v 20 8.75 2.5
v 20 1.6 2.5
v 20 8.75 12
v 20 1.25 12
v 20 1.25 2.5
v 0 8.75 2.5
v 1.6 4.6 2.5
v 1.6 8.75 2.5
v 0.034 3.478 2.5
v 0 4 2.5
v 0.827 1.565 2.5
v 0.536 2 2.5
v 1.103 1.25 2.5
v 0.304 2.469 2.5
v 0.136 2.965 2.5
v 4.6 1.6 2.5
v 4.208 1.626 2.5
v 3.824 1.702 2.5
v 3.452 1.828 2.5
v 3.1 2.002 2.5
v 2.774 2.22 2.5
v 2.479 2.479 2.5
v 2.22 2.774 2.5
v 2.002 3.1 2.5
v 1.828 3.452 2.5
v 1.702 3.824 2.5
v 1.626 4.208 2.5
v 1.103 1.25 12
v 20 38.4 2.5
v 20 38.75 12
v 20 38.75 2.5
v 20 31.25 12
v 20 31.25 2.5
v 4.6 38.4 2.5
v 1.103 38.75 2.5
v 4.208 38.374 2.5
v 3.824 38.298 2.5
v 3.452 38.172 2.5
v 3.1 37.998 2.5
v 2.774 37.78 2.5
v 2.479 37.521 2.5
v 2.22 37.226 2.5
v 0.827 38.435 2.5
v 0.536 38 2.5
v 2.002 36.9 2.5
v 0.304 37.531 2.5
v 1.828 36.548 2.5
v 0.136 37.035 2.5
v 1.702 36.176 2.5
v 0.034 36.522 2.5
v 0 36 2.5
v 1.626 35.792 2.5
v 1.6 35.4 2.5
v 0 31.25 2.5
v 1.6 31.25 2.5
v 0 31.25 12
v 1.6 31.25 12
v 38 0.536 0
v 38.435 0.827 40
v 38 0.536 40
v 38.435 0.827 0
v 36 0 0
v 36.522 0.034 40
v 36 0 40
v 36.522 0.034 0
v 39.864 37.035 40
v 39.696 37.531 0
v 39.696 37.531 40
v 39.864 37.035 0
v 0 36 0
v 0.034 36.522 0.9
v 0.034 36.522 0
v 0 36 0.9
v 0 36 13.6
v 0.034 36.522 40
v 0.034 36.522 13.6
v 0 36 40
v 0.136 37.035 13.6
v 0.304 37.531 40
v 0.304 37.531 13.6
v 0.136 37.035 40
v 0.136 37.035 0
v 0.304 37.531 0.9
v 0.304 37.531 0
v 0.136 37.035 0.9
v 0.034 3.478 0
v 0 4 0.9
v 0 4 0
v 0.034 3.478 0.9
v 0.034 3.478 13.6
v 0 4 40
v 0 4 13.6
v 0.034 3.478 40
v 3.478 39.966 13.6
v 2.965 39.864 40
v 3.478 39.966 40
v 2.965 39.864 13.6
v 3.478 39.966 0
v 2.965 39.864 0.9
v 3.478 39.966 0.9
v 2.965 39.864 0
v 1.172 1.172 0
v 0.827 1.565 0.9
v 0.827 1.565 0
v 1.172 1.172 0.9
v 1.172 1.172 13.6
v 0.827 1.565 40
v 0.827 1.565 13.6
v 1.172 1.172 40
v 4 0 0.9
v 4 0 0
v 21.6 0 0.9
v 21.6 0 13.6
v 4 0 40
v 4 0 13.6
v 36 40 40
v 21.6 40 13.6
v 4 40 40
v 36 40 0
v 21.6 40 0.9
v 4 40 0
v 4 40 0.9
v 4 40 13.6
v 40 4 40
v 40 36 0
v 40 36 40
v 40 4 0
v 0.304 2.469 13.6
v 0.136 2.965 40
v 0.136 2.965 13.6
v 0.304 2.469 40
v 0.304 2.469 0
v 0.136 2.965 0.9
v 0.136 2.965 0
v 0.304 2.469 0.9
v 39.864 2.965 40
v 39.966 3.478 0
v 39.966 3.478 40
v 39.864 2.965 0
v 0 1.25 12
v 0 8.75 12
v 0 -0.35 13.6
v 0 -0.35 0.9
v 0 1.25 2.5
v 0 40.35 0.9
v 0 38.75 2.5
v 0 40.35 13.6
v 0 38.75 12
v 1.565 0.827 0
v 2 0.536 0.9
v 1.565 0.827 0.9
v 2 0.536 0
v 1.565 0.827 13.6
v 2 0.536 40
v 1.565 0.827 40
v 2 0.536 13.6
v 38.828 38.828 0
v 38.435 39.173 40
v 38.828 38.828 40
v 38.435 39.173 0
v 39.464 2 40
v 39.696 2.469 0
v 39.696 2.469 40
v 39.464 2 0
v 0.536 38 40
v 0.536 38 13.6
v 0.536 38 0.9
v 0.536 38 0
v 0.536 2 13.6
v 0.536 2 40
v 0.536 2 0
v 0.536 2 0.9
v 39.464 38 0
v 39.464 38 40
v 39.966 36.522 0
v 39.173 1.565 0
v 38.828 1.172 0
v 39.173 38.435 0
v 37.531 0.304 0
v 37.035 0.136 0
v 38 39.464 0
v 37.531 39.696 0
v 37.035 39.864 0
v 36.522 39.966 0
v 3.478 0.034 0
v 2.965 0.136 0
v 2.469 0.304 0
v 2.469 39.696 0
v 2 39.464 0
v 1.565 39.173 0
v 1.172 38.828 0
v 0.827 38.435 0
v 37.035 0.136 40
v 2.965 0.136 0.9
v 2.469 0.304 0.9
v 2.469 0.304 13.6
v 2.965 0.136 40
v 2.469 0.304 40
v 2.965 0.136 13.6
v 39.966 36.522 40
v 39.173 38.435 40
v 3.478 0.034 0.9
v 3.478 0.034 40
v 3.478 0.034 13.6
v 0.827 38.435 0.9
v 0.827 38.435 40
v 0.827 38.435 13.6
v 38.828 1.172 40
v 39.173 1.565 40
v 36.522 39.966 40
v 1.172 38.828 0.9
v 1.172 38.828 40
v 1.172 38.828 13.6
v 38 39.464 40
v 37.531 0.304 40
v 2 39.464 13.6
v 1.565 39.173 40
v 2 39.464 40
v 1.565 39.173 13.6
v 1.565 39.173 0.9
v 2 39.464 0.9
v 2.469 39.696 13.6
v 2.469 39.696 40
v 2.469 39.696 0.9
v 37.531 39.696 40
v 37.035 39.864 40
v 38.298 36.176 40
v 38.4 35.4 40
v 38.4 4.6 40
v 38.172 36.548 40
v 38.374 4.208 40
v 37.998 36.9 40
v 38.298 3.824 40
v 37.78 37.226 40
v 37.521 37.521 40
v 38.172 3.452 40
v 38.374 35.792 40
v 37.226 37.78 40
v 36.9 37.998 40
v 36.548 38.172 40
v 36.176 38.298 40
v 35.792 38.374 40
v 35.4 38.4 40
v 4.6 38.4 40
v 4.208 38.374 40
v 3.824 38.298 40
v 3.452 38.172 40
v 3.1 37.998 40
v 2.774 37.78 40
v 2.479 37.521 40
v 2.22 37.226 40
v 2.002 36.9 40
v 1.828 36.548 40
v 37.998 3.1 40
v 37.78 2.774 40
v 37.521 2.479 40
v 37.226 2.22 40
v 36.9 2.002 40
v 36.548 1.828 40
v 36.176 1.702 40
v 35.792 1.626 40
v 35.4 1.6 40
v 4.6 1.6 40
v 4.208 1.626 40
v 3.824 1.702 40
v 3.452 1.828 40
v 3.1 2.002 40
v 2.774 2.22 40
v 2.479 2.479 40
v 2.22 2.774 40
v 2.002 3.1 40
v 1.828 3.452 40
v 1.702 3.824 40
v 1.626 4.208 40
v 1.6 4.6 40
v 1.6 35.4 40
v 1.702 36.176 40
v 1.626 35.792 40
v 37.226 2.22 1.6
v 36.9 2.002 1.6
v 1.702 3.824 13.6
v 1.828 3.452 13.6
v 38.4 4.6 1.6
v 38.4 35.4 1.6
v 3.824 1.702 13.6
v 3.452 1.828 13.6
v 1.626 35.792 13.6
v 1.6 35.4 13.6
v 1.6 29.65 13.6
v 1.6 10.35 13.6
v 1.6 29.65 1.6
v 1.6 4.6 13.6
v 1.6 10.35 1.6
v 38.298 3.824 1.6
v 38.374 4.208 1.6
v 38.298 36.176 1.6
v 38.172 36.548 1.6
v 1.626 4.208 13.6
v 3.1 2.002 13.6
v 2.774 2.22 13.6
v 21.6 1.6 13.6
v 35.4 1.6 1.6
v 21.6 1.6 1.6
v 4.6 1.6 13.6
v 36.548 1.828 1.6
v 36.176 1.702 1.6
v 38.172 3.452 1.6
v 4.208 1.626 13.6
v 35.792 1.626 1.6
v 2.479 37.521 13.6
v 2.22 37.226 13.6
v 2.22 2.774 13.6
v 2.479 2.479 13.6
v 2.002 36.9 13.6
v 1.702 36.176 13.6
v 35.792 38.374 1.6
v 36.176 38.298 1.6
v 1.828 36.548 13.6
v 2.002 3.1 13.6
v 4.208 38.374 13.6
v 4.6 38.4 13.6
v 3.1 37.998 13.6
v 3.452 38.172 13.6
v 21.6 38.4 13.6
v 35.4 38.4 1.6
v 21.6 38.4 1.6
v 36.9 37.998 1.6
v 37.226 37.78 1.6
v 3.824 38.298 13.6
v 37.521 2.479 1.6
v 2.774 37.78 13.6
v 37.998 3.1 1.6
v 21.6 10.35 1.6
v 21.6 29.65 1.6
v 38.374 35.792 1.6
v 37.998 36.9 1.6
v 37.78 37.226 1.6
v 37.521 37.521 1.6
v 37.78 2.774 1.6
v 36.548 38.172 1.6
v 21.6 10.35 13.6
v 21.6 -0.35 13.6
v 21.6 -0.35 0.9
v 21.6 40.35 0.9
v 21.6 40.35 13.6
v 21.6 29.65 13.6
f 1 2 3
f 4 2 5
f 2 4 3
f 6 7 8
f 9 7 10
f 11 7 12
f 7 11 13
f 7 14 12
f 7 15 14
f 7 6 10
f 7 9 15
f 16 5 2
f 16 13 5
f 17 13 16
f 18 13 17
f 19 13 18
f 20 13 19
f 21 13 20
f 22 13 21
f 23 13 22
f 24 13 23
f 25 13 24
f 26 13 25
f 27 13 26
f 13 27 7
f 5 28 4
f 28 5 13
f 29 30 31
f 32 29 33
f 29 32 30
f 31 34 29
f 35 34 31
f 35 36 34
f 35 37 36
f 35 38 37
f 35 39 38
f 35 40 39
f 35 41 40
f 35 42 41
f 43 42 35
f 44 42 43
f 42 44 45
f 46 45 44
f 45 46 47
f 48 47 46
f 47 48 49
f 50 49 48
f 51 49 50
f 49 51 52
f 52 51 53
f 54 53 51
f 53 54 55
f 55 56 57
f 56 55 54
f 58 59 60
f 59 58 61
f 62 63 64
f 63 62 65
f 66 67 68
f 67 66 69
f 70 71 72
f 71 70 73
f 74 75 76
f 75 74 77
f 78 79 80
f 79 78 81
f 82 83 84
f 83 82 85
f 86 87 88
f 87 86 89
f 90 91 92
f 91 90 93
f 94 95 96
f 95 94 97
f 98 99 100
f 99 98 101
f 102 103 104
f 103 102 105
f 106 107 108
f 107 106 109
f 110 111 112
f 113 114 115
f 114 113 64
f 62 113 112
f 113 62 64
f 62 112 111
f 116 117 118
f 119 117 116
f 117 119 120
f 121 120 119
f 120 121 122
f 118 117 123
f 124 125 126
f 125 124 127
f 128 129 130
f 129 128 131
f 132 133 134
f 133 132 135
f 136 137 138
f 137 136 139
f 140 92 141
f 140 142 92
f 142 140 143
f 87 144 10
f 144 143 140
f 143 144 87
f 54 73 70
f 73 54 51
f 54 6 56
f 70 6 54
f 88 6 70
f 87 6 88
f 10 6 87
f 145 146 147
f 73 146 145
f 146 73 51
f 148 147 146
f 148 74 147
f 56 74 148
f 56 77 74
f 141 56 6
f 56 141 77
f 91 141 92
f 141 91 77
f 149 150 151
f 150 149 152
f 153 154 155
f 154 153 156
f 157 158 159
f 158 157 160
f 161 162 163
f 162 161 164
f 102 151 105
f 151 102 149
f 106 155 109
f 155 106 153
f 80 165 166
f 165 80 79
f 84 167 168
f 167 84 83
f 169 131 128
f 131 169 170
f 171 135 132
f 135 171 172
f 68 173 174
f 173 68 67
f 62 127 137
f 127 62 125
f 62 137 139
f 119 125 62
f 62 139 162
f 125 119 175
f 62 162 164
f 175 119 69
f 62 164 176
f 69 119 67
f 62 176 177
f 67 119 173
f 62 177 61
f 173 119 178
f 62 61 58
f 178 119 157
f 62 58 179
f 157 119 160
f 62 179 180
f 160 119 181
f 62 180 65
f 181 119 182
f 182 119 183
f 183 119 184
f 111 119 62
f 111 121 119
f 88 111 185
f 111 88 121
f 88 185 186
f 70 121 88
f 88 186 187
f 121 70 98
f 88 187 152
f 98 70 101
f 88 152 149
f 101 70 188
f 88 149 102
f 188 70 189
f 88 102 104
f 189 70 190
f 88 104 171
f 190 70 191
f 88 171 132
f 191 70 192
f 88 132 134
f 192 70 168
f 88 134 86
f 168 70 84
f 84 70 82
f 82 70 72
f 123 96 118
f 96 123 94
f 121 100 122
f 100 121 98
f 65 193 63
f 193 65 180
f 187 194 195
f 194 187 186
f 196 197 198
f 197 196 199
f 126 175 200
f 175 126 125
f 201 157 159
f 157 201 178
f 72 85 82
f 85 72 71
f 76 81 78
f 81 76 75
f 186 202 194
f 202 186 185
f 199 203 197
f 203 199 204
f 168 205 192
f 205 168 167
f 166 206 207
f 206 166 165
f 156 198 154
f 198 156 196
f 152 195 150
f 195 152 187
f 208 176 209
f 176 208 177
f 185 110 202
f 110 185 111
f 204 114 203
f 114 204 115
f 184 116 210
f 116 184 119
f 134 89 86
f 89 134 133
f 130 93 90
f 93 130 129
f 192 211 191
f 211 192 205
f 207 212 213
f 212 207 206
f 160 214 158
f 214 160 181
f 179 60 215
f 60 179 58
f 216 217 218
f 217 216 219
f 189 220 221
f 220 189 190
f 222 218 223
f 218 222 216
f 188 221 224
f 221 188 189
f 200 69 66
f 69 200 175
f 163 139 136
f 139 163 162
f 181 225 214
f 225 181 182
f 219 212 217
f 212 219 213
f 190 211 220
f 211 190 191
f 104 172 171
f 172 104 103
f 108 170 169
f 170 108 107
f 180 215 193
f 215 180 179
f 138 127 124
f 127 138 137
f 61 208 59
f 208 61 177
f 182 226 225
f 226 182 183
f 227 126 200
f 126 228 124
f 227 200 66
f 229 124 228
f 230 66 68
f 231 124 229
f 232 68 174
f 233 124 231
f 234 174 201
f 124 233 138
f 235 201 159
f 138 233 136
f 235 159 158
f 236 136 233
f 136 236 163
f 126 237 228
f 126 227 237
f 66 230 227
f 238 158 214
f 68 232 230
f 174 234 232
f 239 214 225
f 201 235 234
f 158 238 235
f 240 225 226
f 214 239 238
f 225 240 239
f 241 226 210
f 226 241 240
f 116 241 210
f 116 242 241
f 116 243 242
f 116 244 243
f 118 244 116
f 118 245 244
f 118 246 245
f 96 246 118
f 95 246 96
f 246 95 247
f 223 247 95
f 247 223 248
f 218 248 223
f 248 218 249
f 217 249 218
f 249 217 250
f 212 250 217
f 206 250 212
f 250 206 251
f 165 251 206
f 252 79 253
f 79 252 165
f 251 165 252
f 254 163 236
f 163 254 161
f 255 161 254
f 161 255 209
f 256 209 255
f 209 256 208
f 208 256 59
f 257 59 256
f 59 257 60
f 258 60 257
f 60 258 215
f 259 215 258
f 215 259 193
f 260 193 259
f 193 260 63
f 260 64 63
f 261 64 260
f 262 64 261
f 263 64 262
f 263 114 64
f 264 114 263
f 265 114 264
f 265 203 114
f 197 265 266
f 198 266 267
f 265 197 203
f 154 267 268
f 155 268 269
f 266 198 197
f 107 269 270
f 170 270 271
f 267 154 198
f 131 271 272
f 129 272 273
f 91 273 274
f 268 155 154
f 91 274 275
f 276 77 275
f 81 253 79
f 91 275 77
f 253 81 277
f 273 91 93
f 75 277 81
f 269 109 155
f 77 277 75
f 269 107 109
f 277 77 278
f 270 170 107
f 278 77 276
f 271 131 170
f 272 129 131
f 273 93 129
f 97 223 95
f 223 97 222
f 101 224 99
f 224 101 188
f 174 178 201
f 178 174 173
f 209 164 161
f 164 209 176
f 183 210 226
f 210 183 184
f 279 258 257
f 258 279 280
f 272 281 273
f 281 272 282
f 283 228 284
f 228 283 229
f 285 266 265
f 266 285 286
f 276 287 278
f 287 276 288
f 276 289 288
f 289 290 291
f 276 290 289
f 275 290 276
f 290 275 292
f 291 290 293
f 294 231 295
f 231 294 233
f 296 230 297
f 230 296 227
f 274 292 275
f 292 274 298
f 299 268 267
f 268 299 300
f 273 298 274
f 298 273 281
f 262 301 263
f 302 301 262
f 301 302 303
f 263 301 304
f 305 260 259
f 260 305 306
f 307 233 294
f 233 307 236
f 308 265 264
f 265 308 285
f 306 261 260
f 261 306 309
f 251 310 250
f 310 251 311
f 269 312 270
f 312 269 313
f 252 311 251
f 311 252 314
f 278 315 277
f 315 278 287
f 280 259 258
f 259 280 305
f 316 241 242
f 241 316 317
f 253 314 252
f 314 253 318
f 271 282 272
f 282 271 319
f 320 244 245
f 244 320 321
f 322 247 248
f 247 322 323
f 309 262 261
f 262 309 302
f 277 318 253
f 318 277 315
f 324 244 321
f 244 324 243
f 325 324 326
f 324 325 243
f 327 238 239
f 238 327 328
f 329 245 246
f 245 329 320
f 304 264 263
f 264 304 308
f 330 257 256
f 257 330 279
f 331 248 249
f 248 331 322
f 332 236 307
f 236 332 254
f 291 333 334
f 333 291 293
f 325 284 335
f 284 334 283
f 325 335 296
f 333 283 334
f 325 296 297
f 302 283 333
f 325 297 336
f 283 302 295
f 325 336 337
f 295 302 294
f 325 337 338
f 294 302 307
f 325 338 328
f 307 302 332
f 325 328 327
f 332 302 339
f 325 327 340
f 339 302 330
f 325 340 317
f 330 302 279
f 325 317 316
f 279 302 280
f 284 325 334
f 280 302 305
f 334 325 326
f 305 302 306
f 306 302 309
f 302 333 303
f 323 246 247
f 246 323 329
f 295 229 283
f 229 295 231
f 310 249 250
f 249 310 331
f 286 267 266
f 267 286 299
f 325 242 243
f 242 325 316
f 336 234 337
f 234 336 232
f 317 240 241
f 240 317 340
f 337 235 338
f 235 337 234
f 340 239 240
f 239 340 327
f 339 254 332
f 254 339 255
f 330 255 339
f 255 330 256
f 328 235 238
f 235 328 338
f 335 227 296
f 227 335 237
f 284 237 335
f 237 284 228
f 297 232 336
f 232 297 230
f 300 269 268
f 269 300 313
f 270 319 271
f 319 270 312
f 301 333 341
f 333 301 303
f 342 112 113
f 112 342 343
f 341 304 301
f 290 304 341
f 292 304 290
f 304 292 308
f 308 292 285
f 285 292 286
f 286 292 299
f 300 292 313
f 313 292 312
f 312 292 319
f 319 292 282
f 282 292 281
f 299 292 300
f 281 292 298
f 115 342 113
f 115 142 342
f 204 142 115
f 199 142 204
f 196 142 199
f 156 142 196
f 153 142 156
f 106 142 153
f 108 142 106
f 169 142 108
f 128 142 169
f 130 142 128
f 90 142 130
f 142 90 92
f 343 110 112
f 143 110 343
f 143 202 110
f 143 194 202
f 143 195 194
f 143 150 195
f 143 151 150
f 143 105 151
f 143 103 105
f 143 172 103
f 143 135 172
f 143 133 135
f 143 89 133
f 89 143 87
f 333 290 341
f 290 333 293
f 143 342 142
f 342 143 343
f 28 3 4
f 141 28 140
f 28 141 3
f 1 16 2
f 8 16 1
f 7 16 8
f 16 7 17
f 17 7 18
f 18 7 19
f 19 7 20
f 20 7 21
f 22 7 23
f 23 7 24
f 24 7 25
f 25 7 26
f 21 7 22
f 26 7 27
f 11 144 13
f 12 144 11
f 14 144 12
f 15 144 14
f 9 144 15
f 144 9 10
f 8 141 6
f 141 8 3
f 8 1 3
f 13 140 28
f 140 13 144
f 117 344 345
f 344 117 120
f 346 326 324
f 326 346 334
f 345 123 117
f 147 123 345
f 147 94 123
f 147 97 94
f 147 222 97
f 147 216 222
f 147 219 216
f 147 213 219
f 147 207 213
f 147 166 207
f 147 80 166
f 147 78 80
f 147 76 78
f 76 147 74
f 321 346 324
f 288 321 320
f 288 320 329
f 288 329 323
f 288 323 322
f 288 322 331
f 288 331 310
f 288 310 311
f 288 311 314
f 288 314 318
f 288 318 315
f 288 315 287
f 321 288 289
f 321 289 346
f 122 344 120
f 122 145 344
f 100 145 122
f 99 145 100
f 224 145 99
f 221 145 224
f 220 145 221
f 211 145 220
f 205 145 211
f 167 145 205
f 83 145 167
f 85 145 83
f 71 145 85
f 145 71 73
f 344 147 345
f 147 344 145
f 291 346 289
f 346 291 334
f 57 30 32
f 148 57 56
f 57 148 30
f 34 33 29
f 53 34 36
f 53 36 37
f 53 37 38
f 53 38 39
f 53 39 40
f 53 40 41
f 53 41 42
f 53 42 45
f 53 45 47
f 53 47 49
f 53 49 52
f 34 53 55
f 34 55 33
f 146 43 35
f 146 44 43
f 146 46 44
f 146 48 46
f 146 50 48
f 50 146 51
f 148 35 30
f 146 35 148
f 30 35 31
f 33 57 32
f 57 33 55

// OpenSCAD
// file: params.scad
// ===========================================================================
//  Cozmo replica - shared dimensions for every printed part
//  Units: mm.  Robot frame: x = forward, y = left, z = up, origin = ground
//  centre.  Change values here, then re-export with hardware/3d/export.sh.
// ===========================================================================

$fn = 48;
eps = 0.01;
clr = 0.25;            // general printing clearance

// ---------------------------------------------------------------- fasteners
m3_hole      = 3.3;    // clearance hole
m3_tap       = 2.6;    // self-tapping into plastic
m3_nut_af    = 5.7;    // nut across flats (+clearance)
m3_nut_h     = 2.6;
m2_tap       = 1.8;
pin_hole     = 1.95;   // 1.75 mm filament used as track pins

// ---------------------------------------------------------------- tracks
pitch        = 8;      // track link pitch
teeth        = 12;     // sprocket teeth = links wrapped per revolution
link_t       = 3.6;    // link thickness (= hinge barrel diameter)
link_w       = 16;     // link width
grouser_h    = 1.2;    // tread ridge height
r_pin        = (pitch / 2) / sin(180 / teeth);    // pin circle radius (15.45)
axle_z       = r_pin + link_t / 2 + grouser_h;    // axle height (18.45)
wheelbase    = 56;     // with 26 links per side: 2*56 + 12*8 = 208 = 26*8
links_per_side = 26;
axle_x_rear  = -wheelbase / 2;   // drive sprocket (motor)
axle_x_front =  wheelbase / 2;   // idler

// ---------------------------------------------------------------- chassis tub
wall         = 2;
tub_len      = 86;
tub_w        = 70;
tub_z0       = 8;      // ground clearance
tub_h        = 42;     // tub top at z = 50
tub_r        = 6;      // vertical corner radius
floor_t      = 2;
tub_top      = tub_z0 + tub_h;
track_y      = tub_w / 2 + 1 + link_w / 2;        // 44: track centre line

// ---------------------------------------------------------------- N20 motor
n20_w        = 12.2;   // gearbox width (z when mounted)
n20_h        = 10.2;   // gearbox height
n20_len      = 33;     // gearbox + motor + encoder
n20_shaft_d  = 3;
n20_shaft_flat = 2.5;  // D-shaft flat
n20_shaft_len = 10;

// ---------------------------------------------------------------- servos (SG90 / MG90S)
servo_l      = 23.0;   // body length
servo_w      = 12.6;   // body width
servo_h      = 22.8;   // body height (to tab underside ~15.9)
servo_tab_l  = 32.6;   // length over mounting tabs
servo_tab_t  = 2.6;
servo_tab_z  = 15.9;   // tab underside from body bottom
servo_shaft_off = 5.9; // output shaft centre from body end
servo_shaft_h = 28.5;  // body bottom to top of spline

// ---------------------------------------------------------------- OLED
// Default: 1.3" I2C module (SH1106). For a 0.96" module set oled_096 = true
// (and OLED_IS_SH1106 = false in firmware/include/config.h).
oled_096     = false;
oled_pcb     = oled_096 ? [27.4, 27.8] : [35.6, 33.8];  // w x h
oled_view    = oled_096 ? [23.0, 12.0] : [30.0, 15.4];  // visible window
oled_view_dz = oled_096 ? 3.6 : 2.6;   // window centre above PCB centre
oled_pcb_t   = 1.7;
oled_glass_t = 1.6;
oled_hole_d  = 2.2;
oled_hole_in = oled_096 ? 2.0 : 2.3;   // hole centre from PCB edges

// ---------------------------------------------------------------- head
head_w       = 56;     // y
head_d       = 36;     // x
head_h       = 44;     // z
head_r       = 7;
head_wall    = 1.8;
head_pivot   = [6, 0, 72];     // pivot axis position in robot frame
head_below   = 12;     // head bottom is this far below the pivot
cheek_t      = 3;

// ---------------------------------------------------------------- lift (parallel 4-bar)
lift_pivot_x = -25;
lift_pivot_lo_z = 59;
lift_pivot_hi_z = 71;
lift_link_len = 80;
lift_link_y  = 57.5;   // link centre plane (outside the tracks + servo horn)
lift_link_t  = 4;
lift_link_h  = 7;
carrier_drop = 28;     // carrier extends this far below the lower pin
fork_y       = 15;     // forks at +-fork_y
fork_len     = 16;

// ---------------------------------------------------------------- misc parts
battery      = [52, 36, 11];   // 1S LiPo 103450 bay (l, w, h)
speaker_d    = 28.5;           // 28 mm 8 ohm speaker
speaker_t    = 5;
switch_slot  = [8.8, 4.2];     // SS12D00 slide switch
usbc_slot    = [9.6, 3.8];     // TP4056 USB-C charging port
led_count    = 4;
led_pitch    = 7;              // WS2812 spacing on the backpack bar

// ---------------------------------------------------------------- helpers
module rounded_box(size, r, center = false) {
  // Box with rounded vertical edges.
  translate(center ? [-size[0] / 2, -size[1] / 2, -size[2] / 2] : [0, 0, 0])
    hull() for (x = [r, size[0] - r], y = [r, size[1] - r])
      translate([x, y, 0]) cylinder(r = r, h = size[2]);
}

module rounded_cube(size, r) {
  // Box with every edge rounded (centred).
  hull() for (x = [-1, 1], y = [-1, 1], z = [-1, 1])
    translate([x * (size[0] / 2 - r), y * (size[1] / 2 - r), z * (size[2] / 2 - r)])
      sphere(r = r, $fn = 24);
}

module hex_nut_pocket(h = m3_nut_h) {
  cylinder(d = m3_nut_af / cos(30), h = h, $fn = 6);
}
// main file
// ===========================================================================
//  Play cube the robot can pick up with its forks. Hollow, with a lid, so
//  you can add weight (coins) or a battery + LED inside.
//    part = "body" / "lid"
// ===========================================================================
include <params.scad>

part = "body";
size = 40;
cw = 1.6;
slot = [7.5, 9.5];            // fork slot (width, height)
slot_z = 2.5;                 // slot bottom above the floor
slot_depth = 20;

module body() {
  difference() {
    rounded_box([size, size, size], 4);
    translate([cw, cw, cw]) rounded_box([size - 2 * cw, size - 2 * cw, size], 3);
    // Fork slots on the front face (x = 0), matching fork spacing
    for (s = [-1, 1])
      translate([-1, size / 2 + s * fork_y - slot[0] / 2, slot_z]) cube([slot_depth + 1, slot[0], slot[1]]);
    // Face marker so the robot (and you) know which side has the slots
    translate([size / 2, size / 2, size - 0.6]) cylinder(d = 10, h = 1);
  }
  // Slot liners (closed tubes inside the hollow cube)
  for (s = [-1, 1])
    translate([0, size / 2 + s * fork_y - slot[0] / 2 - cw, slot_z - cw])
      difference() {
        cube([slot_depth + cw, slot[0] + 2 * cw, slot[1] + 2 * cw]);
        translate([-1, cw, cw]) cube([slot_depth + 1, slot[0], slot[1]]);
      }
}

module lid() {
  difference() {
    union() {
      rounded_box([size, size, cw], 4);
      translate([cw + 0.3, cw + 0.3, cw - eps]) rounded_box([size - 2 * cw - 0.6, size - 2 * cw - 0.6, 3], 3);
    }
    translate([cw + 1.8, cw + 1.8, cw]) rounded_box([size - 2 * cw - 3.6, size - 2 * cw - 3.6, 4], 2);
  }
}

if (part == "lid") lid(); else body();
